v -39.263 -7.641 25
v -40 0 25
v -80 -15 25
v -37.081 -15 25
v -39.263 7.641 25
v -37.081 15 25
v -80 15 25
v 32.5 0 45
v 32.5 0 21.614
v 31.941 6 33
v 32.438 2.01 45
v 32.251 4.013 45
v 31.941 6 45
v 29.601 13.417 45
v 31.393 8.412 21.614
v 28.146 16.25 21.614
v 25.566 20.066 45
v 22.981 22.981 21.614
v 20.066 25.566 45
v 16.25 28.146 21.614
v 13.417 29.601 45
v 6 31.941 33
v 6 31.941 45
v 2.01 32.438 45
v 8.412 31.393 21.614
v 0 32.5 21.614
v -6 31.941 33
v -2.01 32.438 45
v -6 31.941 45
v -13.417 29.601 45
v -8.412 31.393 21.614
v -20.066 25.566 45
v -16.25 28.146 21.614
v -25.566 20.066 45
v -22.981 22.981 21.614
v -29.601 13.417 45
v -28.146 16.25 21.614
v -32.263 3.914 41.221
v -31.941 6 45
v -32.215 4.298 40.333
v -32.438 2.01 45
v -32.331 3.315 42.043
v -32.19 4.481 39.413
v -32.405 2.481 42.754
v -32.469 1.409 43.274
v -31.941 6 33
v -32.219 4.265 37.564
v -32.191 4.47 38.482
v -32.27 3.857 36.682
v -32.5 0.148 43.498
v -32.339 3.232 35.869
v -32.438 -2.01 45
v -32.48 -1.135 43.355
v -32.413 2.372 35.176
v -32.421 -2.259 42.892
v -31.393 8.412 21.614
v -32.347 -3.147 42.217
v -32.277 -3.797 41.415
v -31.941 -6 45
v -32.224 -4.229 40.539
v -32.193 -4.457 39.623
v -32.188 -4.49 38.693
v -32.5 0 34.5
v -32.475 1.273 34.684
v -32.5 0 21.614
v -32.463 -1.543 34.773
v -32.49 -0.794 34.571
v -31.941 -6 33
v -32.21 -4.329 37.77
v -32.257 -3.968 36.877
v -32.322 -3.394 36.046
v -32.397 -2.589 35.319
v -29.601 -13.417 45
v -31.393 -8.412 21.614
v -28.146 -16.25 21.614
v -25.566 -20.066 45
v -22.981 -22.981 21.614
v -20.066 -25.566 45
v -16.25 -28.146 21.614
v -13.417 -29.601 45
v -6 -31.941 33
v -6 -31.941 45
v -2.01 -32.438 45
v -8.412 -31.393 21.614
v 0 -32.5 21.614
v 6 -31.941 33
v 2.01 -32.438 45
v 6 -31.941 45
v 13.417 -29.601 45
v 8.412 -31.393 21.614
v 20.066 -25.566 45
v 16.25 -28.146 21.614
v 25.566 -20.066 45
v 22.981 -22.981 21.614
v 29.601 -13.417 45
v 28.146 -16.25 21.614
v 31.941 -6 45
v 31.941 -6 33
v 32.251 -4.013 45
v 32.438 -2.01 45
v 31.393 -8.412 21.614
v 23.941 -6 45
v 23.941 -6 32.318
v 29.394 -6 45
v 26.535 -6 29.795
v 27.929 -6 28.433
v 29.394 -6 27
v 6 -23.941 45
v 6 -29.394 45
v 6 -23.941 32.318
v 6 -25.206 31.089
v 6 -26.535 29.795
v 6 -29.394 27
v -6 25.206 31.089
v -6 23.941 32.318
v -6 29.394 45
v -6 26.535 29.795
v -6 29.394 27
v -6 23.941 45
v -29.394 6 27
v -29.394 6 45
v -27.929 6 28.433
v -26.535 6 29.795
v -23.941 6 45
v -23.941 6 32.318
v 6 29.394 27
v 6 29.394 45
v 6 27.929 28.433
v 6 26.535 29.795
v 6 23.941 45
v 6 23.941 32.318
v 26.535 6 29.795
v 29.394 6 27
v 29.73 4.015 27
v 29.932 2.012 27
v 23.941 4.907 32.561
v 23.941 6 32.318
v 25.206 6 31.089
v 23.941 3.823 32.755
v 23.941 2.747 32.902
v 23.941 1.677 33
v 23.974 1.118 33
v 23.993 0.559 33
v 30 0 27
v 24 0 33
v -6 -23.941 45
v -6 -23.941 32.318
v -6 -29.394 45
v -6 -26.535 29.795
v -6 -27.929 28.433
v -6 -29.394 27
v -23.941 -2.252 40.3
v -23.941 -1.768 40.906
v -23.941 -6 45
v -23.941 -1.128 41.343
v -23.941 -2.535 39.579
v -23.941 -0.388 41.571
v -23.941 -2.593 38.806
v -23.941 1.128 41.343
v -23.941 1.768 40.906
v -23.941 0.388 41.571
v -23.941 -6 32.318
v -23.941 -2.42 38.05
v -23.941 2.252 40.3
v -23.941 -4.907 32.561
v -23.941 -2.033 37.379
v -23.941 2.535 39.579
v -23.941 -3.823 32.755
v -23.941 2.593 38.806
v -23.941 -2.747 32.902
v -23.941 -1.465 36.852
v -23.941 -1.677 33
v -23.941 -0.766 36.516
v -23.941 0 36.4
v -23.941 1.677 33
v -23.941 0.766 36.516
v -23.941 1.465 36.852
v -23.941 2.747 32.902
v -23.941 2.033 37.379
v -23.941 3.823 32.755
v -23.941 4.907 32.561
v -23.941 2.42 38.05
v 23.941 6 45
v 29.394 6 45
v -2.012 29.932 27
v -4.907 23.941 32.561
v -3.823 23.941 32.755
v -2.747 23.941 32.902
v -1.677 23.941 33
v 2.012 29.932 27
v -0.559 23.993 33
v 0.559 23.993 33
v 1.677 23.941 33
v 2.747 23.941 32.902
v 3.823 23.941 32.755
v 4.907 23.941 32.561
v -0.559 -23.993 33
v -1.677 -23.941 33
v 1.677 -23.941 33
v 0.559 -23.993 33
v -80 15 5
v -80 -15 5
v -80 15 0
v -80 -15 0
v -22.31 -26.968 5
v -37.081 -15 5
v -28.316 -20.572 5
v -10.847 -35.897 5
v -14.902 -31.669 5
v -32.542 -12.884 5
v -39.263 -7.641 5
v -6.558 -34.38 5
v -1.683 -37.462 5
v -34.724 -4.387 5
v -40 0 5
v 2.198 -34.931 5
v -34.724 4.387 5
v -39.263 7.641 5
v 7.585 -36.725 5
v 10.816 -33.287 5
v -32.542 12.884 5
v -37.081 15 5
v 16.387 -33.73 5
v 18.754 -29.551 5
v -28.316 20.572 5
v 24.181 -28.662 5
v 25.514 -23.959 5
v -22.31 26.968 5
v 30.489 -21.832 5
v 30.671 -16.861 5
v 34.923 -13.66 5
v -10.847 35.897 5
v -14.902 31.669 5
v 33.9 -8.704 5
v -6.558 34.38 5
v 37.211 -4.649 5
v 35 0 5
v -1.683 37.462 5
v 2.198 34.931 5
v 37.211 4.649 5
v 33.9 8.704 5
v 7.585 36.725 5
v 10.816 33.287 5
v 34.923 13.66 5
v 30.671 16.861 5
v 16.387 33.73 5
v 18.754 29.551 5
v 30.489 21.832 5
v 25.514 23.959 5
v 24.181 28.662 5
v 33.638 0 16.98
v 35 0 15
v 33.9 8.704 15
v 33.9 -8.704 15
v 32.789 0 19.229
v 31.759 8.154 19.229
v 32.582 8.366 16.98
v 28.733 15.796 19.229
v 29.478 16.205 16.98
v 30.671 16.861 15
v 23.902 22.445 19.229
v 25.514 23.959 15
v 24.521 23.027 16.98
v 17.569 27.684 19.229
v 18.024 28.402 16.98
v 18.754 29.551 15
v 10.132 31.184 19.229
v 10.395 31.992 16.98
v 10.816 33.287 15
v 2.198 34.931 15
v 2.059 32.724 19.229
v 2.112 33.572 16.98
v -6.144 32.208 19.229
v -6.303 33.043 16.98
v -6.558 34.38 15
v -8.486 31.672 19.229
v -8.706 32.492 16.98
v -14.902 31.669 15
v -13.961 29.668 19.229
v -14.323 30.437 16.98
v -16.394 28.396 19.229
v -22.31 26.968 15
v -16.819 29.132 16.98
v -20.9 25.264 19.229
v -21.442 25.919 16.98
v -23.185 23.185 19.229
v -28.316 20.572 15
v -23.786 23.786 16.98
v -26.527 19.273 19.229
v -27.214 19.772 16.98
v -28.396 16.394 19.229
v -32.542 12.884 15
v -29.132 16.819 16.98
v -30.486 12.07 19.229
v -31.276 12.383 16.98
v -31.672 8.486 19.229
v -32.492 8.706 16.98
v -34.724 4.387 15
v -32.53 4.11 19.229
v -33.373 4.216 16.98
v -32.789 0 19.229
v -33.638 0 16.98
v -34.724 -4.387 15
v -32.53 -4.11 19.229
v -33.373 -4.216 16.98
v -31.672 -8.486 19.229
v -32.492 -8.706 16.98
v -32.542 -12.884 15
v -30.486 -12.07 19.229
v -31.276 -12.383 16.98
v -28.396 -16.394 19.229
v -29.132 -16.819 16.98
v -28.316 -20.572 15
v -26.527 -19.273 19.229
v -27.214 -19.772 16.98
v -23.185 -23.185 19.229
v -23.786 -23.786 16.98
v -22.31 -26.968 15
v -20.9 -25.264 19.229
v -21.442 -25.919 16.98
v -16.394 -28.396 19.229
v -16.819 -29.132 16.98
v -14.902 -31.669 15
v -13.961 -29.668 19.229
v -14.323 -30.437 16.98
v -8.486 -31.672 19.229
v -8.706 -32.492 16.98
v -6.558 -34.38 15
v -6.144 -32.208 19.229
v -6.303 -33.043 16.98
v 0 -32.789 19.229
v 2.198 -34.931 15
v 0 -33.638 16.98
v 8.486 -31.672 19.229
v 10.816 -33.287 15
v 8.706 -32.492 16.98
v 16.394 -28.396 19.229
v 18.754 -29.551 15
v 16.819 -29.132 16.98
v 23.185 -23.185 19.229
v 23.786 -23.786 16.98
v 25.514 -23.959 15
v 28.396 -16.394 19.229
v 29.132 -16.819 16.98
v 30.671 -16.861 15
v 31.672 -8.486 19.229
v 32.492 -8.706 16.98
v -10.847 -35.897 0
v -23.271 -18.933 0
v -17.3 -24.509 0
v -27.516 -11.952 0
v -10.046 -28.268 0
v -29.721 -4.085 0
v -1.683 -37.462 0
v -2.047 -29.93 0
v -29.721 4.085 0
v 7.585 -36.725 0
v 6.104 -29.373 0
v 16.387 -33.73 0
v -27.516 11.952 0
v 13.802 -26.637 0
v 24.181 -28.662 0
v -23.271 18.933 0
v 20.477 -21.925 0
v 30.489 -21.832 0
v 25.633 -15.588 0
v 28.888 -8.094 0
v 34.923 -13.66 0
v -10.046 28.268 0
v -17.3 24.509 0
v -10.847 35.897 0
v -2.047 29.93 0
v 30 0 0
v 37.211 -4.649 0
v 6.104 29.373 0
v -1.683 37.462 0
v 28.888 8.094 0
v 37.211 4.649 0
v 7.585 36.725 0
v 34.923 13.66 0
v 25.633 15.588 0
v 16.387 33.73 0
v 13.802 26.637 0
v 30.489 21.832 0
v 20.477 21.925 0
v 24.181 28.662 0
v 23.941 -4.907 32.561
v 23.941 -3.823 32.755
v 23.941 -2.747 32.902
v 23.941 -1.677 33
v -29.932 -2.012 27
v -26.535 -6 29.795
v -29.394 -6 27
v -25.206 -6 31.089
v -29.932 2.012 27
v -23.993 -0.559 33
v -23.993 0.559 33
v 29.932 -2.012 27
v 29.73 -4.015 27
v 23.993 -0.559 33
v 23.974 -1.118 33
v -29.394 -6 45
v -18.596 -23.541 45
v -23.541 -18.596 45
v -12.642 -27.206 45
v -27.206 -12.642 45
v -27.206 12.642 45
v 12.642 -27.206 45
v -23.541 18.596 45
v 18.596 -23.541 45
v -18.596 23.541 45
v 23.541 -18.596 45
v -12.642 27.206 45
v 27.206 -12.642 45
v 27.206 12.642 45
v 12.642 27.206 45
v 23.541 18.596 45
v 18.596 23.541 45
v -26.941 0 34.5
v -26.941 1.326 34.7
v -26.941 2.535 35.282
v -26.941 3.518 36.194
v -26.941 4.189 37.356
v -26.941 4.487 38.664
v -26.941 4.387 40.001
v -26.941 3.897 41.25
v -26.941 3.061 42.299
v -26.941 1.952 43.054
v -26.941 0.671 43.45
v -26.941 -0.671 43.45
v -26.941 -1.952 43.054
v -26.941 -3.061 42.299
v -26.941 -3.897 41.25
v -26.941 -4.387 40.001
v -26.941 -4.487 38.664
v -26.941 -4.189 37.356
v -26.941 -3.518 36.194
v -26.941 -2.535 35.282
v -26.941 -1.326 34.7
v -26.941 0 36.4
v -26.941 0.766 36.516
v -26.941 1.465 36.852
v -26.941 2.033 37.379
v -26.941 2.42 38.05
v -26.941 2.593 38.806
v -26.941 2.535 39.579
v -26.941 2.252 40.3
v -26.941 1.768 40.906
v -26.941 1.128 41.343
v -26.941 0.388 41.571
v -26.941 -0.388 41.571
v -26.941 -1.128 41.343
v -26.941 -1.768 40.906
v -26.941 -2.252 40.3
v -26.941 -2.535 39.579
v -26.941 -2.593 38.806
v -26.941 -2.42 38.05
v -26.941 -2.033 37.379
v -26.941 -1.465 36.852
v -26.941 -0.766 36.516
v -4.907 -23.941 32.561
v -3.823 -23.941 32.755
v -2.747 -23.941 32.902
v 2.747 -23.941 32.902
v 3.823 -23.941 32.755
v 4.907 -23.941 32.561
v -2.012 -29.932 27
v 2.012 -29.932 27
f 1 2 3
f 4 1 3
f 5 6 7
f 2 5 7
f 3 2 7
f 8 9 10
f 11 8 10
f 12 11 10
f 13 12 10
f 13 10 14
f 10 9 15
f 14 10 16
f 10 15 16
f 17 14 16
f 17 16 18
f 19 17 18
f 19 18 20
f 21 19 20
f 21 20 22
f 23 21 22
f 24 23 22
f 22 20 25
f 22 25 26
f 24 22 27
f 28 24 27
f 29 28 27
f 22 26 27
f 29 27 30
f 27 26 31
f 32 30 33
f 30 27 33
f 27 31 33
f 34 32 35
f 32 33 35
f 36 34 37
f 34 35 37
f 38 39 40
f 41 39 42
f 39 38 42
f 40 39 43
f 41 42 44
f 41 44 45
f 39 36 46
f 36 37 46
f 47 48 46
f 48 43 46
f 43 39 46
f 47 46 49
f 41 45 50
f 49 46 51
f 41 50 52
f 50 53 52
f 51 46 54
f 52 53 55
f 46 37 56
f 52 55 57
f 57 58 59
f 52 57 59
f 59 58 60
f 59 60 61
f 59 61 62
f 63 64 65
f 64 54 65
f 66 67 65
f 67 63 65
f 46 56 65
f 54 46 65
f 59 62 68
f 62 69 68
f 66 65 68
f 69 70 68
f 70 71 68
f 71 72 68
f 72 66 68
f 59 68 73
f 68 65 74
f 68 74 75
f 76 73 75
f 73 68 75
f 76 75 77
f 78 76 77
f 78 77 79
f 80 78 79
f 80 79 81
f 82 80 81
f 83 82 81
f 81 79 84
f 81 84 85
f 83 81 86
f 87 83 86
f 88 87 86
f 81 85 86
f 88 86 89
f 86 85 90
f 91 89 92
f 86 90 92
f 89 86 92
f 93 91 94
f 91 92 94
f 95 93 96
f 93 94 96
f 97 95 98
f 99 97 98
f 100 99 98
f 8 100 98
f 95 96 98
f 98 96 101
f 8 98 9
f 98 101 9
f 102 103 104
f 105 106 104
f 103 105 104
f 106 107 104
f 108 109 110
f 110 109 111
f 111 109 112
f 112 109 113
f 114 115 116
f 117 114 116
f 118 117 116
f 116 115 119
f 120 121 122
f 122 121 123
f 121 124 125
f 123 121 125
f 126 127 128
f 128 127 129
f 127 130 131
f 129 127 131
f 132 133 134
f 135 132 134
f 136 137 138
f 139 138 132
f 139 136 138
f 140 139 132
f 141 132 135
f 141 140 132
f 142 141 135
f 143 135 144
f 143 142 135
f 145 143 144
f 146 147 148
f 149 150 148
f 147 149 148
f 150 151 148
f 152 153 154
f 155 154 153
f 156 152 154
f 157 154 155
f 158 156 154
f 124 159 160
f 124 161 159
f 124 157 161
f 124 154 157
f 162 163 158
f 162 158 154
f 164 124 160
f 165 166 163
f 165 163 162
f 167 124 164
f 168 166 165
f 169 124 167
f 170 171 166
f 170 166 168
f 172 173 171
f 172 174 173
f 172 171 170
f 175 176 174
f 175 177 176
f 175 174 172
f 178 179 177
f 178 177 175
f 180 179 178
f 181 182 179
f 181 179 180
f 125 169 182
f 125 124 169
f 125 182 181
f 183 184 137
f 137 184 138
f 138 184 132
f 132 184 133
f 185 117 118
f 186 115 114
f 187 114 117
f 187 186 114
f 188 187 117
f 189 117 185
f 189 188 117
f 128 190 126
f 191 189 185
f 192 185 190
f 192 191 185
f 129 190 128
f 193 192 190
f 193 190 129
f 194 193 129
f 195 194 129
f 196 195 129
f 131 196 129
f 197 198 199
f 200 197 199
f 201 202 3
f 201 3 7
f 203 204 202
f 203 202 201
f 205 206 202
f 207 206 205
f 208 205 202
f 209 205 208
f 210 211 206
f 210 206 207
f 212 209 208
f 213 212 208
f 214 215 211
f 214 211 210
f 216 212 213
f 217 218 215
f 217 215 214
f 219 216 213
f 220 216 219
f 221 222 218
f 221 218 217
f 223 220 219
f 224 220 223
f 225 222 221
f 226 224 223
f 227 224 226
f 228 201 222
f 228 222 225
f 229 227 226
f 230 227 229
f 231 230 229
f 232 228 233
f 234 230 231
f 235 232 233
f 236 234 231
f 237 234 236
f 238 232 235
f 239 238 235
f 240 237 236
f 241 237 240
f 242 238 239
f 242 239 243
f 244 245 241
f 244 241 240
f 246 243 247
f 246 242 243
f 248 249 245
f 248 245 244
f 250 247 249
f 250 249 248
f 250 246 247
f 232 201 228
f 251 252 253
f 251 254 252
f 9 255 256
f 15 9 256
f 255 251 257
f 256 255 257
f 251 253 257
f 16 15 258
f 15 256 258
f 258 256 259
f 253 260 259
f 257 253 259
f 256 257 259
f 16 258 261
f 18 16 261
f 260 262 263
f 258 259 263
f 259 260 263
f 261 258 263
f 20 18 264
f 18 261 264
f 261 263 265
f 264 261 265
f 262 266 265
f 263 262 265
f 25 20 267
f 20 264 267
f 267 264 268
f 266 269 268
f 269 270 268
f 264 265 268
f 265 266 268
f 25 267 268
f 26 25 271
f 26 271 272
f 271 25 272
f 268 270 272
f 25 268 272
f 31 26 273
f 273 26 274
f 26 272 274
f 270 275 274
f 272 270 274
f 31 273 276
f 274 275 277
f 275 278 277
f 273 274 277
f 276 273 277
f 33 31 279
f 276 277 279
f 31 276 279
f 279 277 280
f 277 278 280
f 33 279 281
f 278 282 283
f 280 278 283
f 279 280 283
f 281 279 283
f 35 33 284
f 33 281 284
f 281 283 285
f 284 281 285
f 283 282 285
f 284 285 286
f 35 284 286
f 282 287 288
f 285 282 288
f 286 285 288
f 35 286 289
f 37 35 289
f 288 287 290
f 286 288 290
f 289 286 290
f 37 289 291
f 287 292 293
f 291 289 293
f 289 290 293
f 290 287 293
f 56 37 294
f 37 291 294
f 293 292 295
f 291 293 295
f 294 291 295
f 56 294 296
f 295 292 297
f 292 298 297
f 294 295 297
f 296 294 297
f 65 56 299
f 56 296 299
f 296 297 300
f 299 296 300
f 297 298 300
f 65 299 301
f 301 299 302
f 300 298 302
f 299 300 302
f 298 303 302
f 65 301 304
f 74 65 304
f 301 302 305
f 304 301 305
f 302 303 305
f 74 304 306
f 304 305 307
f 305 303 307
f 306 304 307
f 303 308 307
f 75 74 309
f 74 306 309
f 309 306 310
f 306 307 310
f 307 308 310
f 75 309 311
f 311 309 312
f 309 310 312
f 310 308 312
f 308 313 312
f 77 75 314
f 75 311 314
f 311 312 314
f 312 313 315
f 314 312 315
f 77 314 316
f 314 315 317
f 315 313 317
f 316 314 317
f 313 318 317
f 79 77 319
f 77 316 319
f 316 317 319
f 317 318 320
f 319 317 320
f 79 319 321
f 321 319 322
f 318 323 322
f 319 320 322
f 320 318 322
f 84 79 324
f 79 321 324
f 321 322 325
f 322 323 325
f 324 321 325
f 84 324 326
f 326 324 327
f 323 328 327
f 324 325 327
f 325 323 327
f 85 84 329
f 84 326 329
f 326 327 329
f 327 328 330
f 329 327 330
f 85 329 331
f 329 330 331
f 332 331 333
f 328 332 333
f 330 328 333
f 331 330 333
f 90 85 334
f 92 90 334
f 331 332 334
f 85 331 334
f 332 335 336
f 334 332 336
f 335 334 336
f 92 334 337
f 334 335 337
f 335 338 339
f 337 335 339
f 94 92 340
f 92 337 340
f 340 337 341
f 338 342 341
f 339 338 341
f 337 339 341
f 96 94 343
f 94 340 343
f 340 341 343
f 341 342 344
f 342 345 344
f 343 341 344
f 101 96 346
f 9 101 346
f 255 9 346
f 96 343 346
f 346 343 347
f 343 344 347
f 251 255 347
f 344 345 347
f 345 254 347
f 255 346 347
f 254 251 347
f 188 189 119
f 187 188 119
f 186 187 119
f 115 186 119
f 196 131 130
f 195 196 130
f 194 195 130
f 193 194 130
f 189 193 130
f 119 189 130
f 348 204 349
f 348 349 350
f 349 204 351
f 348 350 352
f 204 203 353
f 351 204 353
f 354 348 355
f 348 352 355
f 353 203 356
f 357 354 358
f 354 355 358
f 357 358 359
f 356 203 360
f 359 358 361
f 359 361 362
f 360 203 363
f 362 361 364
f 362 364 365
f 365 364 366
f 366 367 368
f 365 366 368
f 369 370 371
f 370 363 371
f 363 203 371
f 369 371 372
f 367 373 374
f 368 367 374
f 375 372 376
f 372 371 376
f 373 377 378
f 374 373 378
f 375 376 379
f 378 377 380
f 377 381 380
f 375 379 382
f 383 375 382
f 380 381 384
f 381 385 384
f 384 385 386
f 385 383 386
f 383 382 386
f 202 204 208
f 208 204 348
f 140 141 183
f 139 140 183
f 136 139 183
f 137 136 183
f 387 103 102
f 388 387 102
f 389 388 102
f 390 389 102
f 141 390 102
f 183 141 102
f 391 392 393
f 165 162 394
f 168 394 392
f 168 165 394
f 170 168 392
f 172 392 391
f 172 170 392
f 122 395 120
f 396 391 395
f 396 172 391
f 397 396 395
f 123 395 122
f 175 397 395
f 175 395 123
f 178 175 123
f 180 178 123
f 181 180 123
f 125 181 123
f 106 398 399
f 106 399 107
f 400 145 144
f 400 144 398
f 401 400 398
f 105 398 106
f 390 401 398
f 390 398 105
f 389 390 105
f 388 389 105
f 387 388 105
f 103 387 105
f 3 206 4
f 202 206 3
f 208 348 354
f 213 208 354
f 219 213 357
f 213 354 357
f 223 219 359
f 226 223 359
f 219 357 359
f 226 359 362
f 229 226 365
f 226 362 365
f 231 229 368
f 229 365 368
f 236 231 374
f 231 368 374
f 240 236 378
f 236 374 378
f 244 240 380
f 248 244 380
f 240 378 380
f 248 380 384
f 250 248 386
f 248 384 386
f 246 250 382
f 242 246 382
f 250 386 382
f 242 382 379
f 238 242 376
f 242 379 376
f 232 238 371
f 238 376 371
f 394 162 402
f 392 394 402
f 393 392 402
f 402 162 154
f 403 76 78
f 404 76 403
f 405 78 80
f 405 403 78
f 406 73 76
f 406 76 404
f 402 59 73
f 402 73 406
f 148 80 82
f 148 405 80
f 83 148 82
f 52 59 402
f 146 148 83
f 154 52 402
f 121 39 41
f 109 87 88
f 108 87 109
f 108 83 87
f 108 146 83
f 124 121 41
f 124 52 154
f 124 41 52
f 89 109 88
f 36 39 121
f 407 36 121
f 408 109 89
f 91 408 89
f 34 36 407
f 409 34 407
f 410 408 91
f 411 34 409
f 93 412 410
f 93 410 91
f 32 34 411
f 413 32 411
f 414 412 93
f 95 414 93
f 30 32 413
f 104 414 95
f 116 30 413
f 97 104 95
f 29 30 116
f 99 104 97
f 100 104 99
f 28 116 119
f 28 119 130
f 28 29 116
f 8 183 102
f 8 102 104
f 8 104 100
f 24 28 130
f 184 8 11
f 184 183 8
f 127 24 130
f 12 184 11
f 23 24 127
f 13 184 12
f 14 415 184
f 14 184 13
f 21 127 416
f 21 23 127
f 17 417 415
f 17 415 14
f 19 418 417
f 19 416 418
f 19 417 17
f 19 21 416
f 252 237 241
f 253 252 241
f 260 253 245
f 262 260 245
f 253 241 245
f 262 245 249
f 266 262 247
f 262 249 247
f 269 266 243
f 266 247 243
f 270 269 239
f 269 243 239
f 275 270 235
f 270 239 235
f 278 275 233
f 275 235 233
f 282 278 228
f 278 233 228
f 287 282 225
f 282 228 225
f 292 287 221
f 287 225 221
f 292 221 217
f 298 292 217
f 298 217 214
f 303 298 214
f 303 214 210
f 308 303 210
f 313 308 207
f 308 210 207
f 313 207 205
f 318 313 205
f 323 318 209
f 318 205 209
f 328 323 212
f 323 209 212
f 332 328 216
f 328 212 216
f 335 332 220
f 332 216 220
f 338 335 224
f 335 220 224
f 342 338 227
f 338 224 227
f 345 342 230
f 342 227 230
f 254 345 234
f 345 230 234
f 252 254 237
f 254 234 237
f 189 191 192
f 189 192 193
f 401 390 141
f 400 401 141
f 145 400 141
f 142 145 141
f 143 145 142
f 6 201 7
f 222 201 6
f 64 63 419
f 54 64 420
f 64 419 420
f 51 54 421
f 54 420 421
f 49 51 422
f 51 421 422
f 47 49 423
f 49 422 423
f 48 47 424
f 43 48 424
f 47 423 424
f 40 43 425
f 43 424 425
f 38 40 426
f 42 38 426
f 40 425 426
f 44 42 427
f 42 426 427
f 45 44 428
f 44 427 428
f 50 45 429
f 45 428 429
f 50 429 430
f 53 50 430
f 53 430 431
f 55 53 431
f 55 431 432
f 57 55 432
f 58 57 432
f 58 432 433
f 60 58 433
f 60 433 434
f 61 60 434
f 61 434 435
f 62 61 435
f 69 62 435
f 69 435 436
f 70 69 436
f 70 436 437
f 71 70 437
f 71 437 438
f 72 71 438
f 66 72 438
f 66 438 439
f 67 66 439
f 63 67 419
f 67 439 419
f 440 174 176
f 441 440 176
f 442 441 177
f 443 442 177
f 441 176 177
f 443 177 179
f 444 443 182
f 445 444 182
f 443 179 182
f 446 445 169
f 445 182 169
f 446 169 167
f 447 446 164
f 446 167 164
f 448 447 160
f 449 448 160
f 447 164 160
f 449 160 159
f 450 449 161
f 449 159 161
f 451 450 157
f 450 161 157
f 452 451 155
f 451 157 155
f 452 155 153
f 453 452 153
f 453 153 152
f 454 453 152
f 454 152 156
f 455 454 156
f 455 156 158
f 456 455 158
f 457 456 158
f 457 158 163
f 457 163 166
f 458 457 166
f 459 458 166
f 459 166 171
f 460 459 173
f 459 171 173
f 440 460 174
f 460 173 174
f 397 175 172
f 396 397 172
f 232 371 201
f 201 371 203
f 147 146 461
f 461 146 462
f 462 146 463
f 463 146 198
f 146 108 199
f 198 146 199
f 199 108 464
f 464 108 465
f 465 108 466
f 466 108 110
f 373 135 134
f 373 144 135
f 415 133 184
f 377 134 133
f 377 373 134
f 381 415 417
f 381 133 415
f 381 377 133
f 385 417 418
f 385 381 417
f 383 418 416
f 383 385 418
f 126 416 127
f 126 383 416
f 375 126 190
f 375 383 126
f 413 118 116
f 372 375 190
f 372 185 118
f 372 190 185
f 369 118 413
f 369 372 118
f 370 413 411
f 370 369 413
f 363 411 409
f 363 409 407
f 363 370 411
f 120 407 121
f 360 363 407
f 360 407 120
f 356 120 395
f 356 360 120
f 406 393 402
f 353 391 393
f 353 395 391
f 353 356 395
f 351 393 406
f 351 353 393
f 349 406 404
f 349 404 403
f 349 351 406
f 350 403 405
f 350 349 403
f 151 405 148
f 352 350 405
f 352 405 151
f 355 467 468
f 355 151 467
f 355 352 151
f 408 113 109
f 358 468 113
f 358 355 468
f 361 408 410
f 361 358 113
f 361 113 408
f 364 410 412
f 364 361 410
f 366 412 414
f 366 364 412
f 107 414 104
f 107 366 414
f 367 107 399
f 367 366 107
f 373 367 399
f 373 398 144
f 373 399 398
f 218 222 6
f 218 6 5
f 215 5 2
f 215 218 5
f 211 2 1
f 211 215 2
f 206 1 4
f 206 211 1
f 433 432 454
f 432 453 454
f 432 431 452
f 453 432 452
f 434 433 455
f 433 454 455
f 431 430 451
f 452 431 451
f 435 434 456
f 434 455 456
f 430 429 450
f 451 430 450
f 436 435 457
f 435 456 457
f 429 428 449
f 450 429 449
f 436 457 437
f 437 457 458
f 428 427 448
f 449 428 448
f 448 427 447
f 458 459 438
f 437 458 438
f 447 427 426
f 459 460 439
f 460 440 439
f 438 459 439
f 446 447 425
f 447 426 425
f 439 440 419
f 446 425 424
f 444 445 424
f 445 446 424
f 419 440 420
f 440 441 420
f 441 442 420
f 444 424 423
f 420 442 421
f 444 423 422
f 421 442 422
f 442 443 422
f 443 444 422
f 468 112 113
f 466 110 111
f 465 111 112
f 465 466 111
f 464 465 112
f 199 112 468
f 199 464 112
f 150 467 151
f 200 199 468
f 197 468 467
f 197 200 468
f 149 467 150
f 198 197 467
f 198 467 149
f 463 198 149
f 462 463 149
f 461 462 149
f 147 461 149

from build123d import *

# Parameters (mm, degrees)
ESQUISSE1_R                  = 30
BOSS_EXTRU_1_DEPTH           = 5
ESQUISSE6_R                  = 35
ESQUISSE6_R_2                = 30
BOSS_EXTRU_6_DEPTH           = 10
ESQUISSE7_R                  = 32.5
ESQUISSE7_R_2                = 30
BOSS_EXTRU_8_DEPTH           = 30
CONG_2_R                     = 10
BOSS_EXTRU_9_DEPTH           = 20
ESQUISSE9_W                  = 8
ESQUISSE9_H                  = 12
ESQUISSE9_W_2                = 12
ESQUISSE9_H_2                = 8
BOSS_EXTRU_10_DEPTH          = 12
CHANFREIN1_SIZE              = 6
ENL_V_MAT_EXTRU_1_REACH      = 86.89
ENL_V_MAT_EXTRU_1_END_RADIUS = 32.5
ESQUISSE10_R                 = 4.5
ESQUISSE12_R                 = 4.5
ESQUISSE12_R_2               = 2.6
BOSS_EXTRU_11_DEPTH          = 3


with BuildPart() as part:
    # Esquisse1 → Boss.-Extru.1 (new body)
    with BuildSketch(Plane.XY):
        with BuildLine():
            Line((-10.847469364, 35.896830061), (-80, 15))
            Line((-80, 15), (-80, -15))
            Line((-80, -15), (-10.847469364, -35.896830061))
            ThreePointArc((-10.847469364, -35.896830061), (37.5, 0), (-10.847469364, 35.896830061))
        make_face()
        Circle(ESQUISSE1_R, mode=Mode.SUBTRACT)
    extrude(amount=BOSS_EXTRU_1_DEPTH)

    # Esquisse6 → Boss.-Extru.6 (add)
    with BuildSketch(Plane.XY.offset(5)):
        Circle(ESQUISSE6_R)
        Circle(ESQUISSE6_R_2, mode=Mode.SUBTRACT)
    extrude(amount=BOSS_EXTRU_6_DEPTH)

    # Esquisse7 → Boss.-Extru.8 (add)
    with BuildSketch(Plane.XY.offset(15)):
        Circle(ESQUISSE7_R)
        Circle(ESQUISSE7_R_2, mode=Mode.SUBTRACT)
    extrude(amount=BOSS_EXTRU_8_DEPTH)

    # Congé2
    # the kernel refuses this fillet: 10 mm, written as the material it adds along each edge
    with BuildSketch(Plane(origin=(0, 0, 15), x_dir=(1, 0, 0), z_dir=(0, -1, 0))) as cong_2_piece_1:
        with BuildLine():
            CenterArc((42.5, 6.614378278), CONG_2_R, 180, 41.409622109)
            Line((32.5, 6.614378278), (32.3, 6.614378278))
            Line((32.3, 6.614378278), (32.3, 0))
            Line((32.3, 0), (32.5, -0.2))
            ThreePointArc((32.5, -0.2), (33.75, -0.2), (34.85, -0.132287566))
            Line((34.85, -0.132287566), (35, 0))
        make_face()
    revolve(axis=Axis((0, 0, 15), (0, 0, 1)))

    # Esquisse8 → Boss.-Extru.9 (add)
    with BuildSketch(Plane.XY.offset(5)):
        with BuildLine():
            Line((-80, 15), (-37.080992435, 15))
            ThreePointArc((-37.080992435, 15), (-40, 0), (-37.080992435, -15))
            Line((-37.080992435, -15), (-80, -15))
            Line((-80, -15), (-80, 15))
        make_face()
    extrude(amount=BOSS_EXTRU_9_DEPTH)

    # Esquisse9 → Boss.-Extru.10 (add)
    with BuildSketch(Plane.XY.offset(45)):
        with Locations((-27.941352507, 0)):
            Rectangle(ESQUISSE9_W, ESQUISSE9_H)
        with Locations((0, 27.941352507)):
            Rectangle(ESQUISSE9_W_2, ESQUISSE9_H_2)
        with Locations((27.941352507, 0)):
            Rectangle(ESQUISSE9_W, ESQUISSE9_H)
        with Locations((0, -27.941352507)):
            Rectangle(ESQUISSE9_W_2, ESQUISSE9_H_2)
    extrude(amount=-BOSS_EXTRU_10_DEPTH)

    # Chanfrein1
    # the kernel refuses this chamfer: 6 mm, written as the material it adds along each edge
    with BuildSketch(Plane(origin=(0, 0, 33), x_dir=(-0.6561519302770997, 0.75462881232672, 0), z_dir=(-0.75462881232672, -0.6561519302770997, 0))) as chanfrein1_piece_1_section:
        Polygon((30, CHANFREIN1_SIZE), (30 - CHANFREIN1_SIZE, 0), (30, 0), align=None)
    chanfrein1_piece_1 = revolve(axis=Axis((0, 0, 33), (0, 0, -1)), revolution_arc=82.01410645, mode=Mode.PRIVATE)
    chanfrein1_piece_1 = split(chanfrein1_piece_1, bisect_by=Plane(origin=(-6, 27.82841678, 31.008979001), z_dir=(1, 0, 0)), keep=Keep.TOP, mode=Mode.PRIVATE)
    chanfrein1_piece_1 = split(chanfrein1_piece_1, bisect_by=Plane(origin=(6, 27.82841678, 31.008979001), z_dir=(-1, 0, 0)), keep=Keep.TOP, mode=Mode.PRIVATE)
    chanfrein1_piece_1 = split(chanfrein1_piece_1, bisect_by=Plane(origin=(0, 23.941352507, 31.008979001), z_dir=(0, 1, 0)), keep=Keep.TOP, mode=Mode.PRIVATE)
    add(chanfrein1_piece_1)
    with BuildSketch(Plane(origin=(0, 0, 33), x_dir=(0.754635493716526, 0.6561442460490032, 0), z_dir=(-0.6561442460490032, 0.754635493716526, 0))) as chanfrein1_piece_2_section:
        Polygon((30, CHANFREIN1_SIZE), (30 - CHANFREIN1_SIZE, 0), (30, 0), align=None)
    chanfrein1_piece_2 = revolve(axis=Axis((0, 0, 33), (0, 0, -1)), revolution_arc=41.006469797, mode=Mode.PRIVATE)
    chanfrein1_piece_2 = split(chanfrein1_piece_2, bisect_by=Plane(origin=(27.828416771, 6, 31.008979004), z_dir=(0, -1, 0)), keep=Keep.TOP, mode=Mode.PRIVATE)
    chanfrein1_piece_2 = split(chanfrein1_piece_2, bisect_by=Plane(origin=(23.941352507, 3.002348554, 31.008979004), z_dir=(1, 0, 0)), keep=Keep.TOP, mode=Mode.PRIVATE)
    add(chanfrein1_piece_2)
    with BuildSketch(Plane(origin=(0, 0, 33), x_dir=(0.6561519302770998, -0.7546288123267199, 0), z_dir=(0.7546288123267199, 0.6561519302770998, 0))) as chanfrein1_piece_3_section:
        Polygon((30, CHANFREIN1_SIZE), (30 - CHANFREIN1_SIZE, 0), (30, 0), align=None)
    chanfrein1_piece_3 = revolve(axis=Axis((0, 0, 33), (0, 0, -1)), revolution_arc=82.01410645, mode=Mode.PRIVATE)
    chanfrein1_piece_3 = split(chanfrein1_piece_3, bisect_by=Plane(origin=(6, -27.82841678, 31.008979001), z_dir=(-1, 0, 0)), keep=Keep.TOP, mode=Mode.PRIVATE)
    chanfrein1_piece_3 = split(chanfrein1_piece_3, bisect_by=Plane(origin=(-6, -27.82841678, 31.008979001), z_dir=(1, 0, 0)), keep=Keep.TOP, mode=Mode.PRIVATE)
    chanfrein1_piece_3 = split(chanfrein1_piece_3, bisect_by=Plane(origin=(0, -23.941352507, 31.008979001), z_dir=(0, -1, 0)), keep=Keep.TOP, mode=Mode.PRIVATE)
    add(chanfrein1_piece_3)
    with BuildSketch(Plane(origin=(0, 0, 33), x_dir=(-0.7546288123267202, -0.6561519302770997, 0), z_dir=(0.6561519302770997, -0.7546288123267202, 0))) as chanfrein1_piece_4_section:
        Polygon((30, CHANFREIN1_SIZE), (30 - CHANFREIN1_SIZE, 0), (30, 0), align=None)
    chanfrein1_piece_4 = revolve(axis=Axis((0, 0, 33), (0, 0, -1)), revolution_arc=82.01410645, mode=Mode.PRIVATE)
    chanfrein1_piece_4 = split(chanfrein1_piece_4, bisect_by=Plane(origin=(-27.82841678, -6, 31.008979), z_dir=(0, 1, 0)), keep=Keep.TOP, mode=Mode.PRIVATE)
    chanfrein1_piece_4 = split(chanfrein1_piece_4, bisect_by=Plane(origin=(-27.82841678, 6, 31.008979), z_dir=(0, -1, 0)), keep=Keep.TOP, mode=Mode.PRIVATE)
    chanfrein1_piece_4 = split(chanfrein1_piece_4, bisect_by=Plane(origin=(-23.941352507, 0, 31.008979), z_dir=(-1, 0, 0)), keep=Keep.TOP, mode=Mode.PRIVATE)
    add(chanfrein1_piece_4)
    with BuildSketch(Plane(origin=(0, 0, 33), x_dir=(1, 0, 0), z_dir=(0, 1, 0))) as chanfrein1_piece_5_section:
        Polygon((30, CHANFREIN1_SIZE), (30 - CHANFREIN1_SIZE, 0), (30, 0), align=None)
    chanfrein1_piece_5 = revolve(axis=Axis((0, 0, 33), (0, 0, -1)), revolution_arc=41.006469797, mode=Mode.PRIVATE)
    chanfrein1_piece_5 = split(chanfrein1_piece_5, bisect_by=Plane(origin=(27.828416774, -6, 31.008979003), z_dir=(0, 1, 0)), keep=Keep.TOP, mode=Mode.PRIVATE)
    chanfrein1_piece_5 = split(chanfrein1_piece_5, bisect_by=Plane(origin=(23.941352507, -3.002348554, 31.008979003), z_dir=(1, 0, 0)), keep=Keep.TOP, mode=Mode.PRIVATE)
    add(chanfrein1_piece_5)

    # Enlèv. mat.-Extru.1: up to this cylinder (the profile starts inside it)
    enl_v_mat_extru_1_end = Plane(origin=(0, 0, 39), z_dir=(0, 0, -1)) * Cylinder(ENL_V_MAT_EXTRU_1_END_RADIUS, 239.78, mode=Mode.PRIVATE)
    # Esquisse10 → Enlèv. mat.-Extru.1 (cut, up to the surface)
    with BuildSketch(Plane(origin=(-23.941352507, 0, 0), x_dir=(0, 0, -1), z_dir=(1, 0, 0)), mode=Mode.PRIVATE) as enl_v_mat_extru_1_sk1:
        with Locations((-39, 0)):
            Circle(ESQUISSE10_R)
    enl_v_mat_extru_1_tool1 = extrude(enl_v_mat_extru_1_sk1.sketch, amount=-ENL_V_MAT_EXTRU_1_REACH, mode=Mode.PRIVATE) & enl_v_mat_extru_1_end
    add(enl_v_mat_extru_1_tool1.solids().sort_by_distance((-23.941353, 0, 39))[0], mode=Mode.SUBTRACT)

    # Esquisse12 → Boss.-Extru.11 (add)
    with BuildSketch(Plane(origin=(-23.941352507, 0, 0), x_dir=(0, 0, -1), z_dir=(1, 0, 0))):
        with Locations((-39, 0)):
            Circle(ESQUISSE12_R)
        with Locations((-39, 0)):
            Circle(ESQUISSE12_R_2, mode=Mode.SUBTRACT)
    extrude(amount=-BOSS_EXTRU_11_DEPTH)


solid = part.part
